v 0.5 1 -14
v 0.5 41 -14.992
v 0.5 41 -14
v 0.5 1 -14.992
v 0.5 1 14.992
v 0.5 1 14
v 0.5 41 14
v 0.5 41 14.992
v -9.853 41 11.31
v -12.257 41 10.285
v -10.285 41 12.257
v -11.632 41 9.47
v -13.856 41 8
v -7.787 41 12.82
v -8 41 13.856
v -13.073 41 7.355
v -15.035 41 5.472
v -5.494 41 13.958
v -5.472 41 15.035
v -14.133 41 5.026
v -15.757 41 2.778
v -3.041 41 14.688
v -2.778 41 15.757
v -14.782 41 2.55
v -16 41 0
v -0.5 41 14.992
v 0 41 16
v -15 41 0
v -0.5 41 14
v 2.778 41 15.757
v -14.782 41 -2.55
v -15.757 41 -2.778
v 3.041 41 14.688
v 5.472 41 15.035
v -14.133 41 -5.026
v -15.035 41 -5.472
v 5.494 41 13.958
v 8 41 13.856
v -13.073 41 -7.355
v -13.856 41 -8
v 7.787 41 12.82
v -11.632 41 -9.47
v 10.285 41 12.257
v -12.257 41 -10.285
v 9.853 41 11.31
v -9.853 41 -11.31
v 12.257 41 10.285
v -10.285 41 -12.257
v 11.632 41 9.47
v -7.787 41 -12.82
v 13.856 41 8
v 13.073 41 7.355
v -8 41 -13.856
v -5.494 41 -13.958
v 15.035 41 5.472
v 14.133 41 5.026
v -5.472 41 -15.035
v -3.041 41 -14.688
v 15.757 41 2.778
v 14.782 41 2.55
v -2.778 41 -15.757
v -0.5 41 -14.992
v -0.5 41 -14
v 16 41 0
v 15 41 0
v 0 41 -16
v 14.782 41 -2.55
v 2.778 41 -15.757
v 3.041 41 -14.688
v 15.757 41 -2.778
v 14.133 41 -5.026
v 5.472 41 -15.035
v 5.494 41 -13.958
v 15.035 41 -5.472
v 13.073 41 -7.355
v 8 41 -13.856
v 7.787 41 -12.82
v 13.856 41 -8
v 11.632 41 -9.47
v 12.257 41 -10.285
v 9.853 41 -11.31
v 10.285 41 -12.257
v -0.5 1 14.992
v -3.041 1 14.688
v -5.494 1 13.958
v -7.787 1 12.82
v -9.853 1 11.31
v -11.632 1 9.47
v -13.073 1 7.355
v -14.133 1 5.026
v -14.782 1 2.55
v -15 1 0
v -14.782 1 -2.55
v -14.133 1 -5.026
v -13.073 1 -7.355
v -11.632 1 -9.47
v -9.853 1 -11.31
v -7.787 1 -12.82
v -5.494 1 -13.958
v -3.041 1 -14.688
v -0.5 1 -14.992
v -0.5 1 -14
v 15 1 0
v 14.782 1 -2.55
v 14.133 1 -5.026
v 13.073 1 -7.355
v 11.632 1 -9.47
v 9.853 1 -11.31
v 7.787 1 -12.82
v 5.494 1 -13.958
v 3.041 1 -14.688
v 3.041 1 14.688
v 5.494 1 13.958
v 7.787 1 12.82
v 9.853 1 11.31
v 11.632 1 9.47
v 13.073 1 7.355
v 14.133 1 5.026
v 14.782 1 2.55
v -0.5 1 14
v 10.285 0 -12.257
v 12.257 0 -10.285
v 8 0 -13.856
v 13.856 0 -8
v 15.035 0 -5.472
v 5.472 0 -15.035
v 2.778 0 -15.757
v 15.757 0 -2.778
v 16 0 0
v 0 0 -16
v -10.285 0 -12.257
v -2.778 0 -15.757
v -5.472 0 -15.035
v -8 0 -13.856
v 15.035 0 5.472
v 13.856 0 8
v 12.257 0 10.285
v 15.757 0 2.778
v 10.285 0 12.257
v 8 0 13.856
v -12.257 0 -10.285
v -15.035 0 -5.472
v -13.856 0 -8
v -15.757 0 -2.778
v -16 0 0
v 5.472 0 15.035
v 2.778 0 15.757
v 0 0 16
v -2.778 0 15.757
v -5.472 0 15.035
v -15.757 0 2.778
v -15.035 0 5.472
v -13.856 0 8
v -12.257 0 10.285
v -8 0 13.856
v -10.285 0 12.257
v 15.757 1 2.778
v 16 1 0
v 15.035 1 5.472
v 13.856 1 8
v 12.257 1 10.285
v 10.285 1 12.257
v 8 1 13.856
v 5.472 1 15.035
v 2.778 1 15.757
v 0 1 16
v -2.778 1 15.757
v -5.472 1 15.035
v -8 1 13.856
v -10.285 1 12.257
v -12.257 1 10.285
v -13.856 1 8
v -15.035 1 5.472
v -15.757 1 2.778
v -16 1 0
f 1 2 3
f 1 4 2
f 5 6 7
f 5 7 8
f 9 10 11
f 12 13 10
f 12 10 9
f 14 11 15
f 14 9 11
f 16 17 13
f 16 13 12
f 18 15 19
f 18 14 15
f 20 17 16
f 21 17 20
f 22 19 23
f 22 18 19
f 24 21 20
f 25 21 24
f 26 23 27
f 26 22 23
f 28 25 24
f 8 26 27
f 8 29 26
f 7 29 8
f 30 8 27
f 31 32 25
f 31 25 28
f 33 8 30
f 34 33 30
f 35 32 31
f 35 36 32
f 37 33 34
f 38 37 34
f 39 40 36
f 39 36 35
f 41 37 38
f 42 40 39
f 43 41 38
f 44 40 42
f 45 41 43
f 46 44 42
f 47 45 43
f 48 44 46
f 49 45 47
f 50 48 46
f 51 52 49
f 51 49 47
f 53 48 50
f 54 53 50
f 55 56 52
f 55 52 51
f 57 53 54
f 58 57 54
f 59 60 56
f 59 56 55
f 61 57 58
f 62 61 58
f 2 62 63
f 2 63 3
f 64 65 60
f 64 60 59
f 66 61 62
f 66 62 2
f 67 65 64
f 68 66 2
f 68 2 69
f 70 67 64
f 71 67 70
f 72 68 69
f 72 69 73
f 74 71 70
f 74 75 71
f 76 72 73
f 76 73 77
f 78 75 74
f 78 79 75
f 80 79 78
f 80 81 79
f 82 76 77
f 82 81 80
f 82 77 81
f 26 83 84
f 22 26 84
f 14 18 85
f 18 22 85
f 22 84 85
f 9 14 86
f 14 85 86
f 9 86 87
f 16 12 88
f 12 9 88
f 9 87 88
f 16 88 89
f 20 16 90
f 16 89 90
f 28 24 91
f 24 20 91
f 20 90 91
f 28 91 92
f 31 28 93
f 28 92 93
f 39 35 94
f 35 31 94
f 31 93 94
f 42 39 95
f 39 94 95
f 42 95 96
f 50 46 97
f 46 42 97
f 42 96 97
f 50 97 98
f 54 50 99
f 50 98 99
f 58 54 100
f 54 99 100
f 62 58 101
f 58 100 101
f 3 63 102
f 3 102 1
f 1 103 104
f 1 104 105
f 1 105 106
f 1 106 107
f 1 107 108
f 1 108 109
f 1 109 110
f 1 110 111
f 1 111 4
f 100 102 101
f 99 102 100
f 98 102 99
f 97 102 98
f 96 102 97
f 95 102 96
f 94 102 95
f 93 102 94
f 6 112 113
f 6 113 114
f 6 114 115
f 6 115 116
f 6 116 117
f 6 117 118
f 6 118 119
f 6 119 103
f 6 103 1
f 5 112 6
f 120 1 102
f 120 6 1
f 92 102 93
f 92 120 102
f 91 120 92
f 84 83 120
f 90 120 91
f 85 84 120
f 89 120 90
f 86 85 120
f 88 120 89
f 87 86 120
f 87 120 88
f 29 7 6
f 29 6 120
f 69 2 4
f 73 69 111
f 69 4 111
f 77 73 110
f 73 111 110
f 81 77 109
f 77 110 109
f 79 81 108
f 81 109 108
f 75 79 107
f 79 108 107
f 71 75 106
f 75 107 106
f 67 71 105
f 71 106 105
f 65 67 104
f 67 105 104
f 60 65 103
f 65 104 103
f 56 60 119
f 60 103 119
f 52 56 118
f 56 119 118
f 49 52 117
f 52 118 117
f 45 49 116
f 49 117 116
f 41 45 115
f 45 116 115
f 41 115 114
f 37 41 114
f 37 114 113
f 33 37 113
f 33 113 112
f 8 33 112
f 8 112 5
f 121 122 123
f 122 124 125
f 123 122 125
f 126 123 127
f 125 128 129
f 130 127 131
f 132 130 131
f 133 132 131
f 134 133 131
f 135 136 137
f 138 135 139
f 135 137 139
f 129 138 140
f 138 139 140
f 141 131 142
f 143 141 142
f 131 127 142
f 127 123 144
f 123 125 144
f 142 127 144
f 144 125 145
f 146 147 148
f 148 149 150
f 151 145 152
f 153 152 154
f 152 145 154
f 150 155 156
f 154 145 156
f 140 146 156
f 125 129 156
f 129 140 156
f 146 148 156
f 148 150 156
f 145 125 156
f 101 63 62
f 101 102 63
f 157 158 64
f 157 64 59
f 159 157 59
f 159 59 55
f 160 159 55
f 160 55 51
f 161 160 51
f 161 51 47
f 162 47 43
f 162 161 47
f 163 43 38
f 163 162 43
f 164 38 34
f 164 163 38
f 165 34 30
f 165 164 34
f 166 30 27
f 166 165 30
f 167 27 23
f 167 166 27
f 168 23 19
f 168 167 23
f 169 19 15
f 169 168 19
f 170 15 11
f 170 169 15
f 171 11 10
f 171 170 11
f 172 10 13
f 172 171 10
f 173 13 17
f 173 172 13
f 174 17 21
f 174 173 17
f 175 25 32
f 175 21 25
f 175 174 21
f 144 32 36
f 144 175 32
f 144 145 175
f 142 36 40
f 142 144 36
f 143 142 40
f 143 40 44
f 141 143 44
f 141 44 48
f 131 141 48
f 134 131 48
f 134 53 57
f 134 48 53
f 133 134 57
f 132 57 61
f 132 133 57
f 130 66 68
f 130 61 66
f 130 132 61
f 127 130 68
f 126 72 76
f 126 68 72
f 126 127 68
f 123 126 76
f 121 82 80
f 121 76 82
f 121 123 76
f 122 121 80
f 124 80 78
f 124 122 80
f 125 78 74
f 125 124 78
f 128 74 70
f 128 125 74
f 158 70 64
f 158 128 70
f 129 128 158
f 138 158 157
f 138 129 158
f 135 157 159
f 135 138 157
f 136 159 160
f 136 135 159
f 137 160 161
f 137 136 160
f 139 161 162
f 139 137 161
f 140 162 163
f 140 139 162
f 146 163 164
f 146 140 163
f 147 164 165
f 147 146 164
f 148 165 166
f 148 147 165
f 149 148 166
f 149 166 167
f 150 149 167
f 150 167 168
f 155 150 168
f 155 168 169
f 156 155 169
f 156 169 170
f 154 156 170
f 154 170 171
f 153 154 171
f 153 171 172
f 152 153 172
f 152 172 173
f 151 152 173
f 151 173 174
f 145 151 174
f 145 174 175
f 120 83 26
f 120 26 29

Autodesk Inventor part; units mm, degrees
sketch "Эскиз5" plane through (0, 0, 0) normal (0, 1, 0) x (-1, 0, 0)
  circle A0 centre (0, 0) radius 16
  dimension "d12" = 32
extrude "Выдавливание4" add sketch "Эскиз5" along normal blind 1
sketch "Эскиз7" plane through (0, 1, 0) normal (0, 1, 0) x (1, 0, 0)
  circle A0 centre (0, 0) radius 16
  circle A1 centre (0, 0) radius 16 projected
  circle A2 centre (0, 0) radius 15
  line L0 (0.5, -14) -> (-0.5, -14)
  line L1 (-0.5, 14) -> (0.5, 14)
  line L2 (0.5, -14) -> (-0.5, 14) construction
  line L3 (-0.5, -14) -> (0.5, 14) construction
  line L4 (-0.5, -14) -> (0.5, -14)
  line L5 (0.5, -14) -> (0.5, -15.4866)
  line L6 (0.5, -15.4866) -> (-0.5, -15.4866)
  line L7 (-0.5, -15.4866) -> (-0.5, -14)
  line L8 (0.5, 14) -> (-0.5, 14)
  line L9 (-0.5, 14) -> (-0.5, 15.7701)
  line L10 (-0.5, 15.7701) -> (0.5, 15.7701)
  line L11 (0.5, 15.7701) -> (0.5, 14)
  dimension "d17" = 1
  dimension "d18" = 28
  dimension "d19" = 32
  dimension "d20" = 30
  dimension "d21" = 2.045
  dimension "d22" = 177.955
  dimension "d23" = 0
  dimension "d24" = 1.7701
  dimension "d25" = 31.2568
  dimension "d26" = 0.5
  dimension "d27" = 15.7701
extrude "Выдавливание5" add sketch "Эскиз7" along normal blind 40 contours A0 | L11 L1 L9 A2 | A2 L9 L10 L11 | L5 L6 L7 A2 | A2 L7 L0 L5
properties part number "Корпус для оборудования"
